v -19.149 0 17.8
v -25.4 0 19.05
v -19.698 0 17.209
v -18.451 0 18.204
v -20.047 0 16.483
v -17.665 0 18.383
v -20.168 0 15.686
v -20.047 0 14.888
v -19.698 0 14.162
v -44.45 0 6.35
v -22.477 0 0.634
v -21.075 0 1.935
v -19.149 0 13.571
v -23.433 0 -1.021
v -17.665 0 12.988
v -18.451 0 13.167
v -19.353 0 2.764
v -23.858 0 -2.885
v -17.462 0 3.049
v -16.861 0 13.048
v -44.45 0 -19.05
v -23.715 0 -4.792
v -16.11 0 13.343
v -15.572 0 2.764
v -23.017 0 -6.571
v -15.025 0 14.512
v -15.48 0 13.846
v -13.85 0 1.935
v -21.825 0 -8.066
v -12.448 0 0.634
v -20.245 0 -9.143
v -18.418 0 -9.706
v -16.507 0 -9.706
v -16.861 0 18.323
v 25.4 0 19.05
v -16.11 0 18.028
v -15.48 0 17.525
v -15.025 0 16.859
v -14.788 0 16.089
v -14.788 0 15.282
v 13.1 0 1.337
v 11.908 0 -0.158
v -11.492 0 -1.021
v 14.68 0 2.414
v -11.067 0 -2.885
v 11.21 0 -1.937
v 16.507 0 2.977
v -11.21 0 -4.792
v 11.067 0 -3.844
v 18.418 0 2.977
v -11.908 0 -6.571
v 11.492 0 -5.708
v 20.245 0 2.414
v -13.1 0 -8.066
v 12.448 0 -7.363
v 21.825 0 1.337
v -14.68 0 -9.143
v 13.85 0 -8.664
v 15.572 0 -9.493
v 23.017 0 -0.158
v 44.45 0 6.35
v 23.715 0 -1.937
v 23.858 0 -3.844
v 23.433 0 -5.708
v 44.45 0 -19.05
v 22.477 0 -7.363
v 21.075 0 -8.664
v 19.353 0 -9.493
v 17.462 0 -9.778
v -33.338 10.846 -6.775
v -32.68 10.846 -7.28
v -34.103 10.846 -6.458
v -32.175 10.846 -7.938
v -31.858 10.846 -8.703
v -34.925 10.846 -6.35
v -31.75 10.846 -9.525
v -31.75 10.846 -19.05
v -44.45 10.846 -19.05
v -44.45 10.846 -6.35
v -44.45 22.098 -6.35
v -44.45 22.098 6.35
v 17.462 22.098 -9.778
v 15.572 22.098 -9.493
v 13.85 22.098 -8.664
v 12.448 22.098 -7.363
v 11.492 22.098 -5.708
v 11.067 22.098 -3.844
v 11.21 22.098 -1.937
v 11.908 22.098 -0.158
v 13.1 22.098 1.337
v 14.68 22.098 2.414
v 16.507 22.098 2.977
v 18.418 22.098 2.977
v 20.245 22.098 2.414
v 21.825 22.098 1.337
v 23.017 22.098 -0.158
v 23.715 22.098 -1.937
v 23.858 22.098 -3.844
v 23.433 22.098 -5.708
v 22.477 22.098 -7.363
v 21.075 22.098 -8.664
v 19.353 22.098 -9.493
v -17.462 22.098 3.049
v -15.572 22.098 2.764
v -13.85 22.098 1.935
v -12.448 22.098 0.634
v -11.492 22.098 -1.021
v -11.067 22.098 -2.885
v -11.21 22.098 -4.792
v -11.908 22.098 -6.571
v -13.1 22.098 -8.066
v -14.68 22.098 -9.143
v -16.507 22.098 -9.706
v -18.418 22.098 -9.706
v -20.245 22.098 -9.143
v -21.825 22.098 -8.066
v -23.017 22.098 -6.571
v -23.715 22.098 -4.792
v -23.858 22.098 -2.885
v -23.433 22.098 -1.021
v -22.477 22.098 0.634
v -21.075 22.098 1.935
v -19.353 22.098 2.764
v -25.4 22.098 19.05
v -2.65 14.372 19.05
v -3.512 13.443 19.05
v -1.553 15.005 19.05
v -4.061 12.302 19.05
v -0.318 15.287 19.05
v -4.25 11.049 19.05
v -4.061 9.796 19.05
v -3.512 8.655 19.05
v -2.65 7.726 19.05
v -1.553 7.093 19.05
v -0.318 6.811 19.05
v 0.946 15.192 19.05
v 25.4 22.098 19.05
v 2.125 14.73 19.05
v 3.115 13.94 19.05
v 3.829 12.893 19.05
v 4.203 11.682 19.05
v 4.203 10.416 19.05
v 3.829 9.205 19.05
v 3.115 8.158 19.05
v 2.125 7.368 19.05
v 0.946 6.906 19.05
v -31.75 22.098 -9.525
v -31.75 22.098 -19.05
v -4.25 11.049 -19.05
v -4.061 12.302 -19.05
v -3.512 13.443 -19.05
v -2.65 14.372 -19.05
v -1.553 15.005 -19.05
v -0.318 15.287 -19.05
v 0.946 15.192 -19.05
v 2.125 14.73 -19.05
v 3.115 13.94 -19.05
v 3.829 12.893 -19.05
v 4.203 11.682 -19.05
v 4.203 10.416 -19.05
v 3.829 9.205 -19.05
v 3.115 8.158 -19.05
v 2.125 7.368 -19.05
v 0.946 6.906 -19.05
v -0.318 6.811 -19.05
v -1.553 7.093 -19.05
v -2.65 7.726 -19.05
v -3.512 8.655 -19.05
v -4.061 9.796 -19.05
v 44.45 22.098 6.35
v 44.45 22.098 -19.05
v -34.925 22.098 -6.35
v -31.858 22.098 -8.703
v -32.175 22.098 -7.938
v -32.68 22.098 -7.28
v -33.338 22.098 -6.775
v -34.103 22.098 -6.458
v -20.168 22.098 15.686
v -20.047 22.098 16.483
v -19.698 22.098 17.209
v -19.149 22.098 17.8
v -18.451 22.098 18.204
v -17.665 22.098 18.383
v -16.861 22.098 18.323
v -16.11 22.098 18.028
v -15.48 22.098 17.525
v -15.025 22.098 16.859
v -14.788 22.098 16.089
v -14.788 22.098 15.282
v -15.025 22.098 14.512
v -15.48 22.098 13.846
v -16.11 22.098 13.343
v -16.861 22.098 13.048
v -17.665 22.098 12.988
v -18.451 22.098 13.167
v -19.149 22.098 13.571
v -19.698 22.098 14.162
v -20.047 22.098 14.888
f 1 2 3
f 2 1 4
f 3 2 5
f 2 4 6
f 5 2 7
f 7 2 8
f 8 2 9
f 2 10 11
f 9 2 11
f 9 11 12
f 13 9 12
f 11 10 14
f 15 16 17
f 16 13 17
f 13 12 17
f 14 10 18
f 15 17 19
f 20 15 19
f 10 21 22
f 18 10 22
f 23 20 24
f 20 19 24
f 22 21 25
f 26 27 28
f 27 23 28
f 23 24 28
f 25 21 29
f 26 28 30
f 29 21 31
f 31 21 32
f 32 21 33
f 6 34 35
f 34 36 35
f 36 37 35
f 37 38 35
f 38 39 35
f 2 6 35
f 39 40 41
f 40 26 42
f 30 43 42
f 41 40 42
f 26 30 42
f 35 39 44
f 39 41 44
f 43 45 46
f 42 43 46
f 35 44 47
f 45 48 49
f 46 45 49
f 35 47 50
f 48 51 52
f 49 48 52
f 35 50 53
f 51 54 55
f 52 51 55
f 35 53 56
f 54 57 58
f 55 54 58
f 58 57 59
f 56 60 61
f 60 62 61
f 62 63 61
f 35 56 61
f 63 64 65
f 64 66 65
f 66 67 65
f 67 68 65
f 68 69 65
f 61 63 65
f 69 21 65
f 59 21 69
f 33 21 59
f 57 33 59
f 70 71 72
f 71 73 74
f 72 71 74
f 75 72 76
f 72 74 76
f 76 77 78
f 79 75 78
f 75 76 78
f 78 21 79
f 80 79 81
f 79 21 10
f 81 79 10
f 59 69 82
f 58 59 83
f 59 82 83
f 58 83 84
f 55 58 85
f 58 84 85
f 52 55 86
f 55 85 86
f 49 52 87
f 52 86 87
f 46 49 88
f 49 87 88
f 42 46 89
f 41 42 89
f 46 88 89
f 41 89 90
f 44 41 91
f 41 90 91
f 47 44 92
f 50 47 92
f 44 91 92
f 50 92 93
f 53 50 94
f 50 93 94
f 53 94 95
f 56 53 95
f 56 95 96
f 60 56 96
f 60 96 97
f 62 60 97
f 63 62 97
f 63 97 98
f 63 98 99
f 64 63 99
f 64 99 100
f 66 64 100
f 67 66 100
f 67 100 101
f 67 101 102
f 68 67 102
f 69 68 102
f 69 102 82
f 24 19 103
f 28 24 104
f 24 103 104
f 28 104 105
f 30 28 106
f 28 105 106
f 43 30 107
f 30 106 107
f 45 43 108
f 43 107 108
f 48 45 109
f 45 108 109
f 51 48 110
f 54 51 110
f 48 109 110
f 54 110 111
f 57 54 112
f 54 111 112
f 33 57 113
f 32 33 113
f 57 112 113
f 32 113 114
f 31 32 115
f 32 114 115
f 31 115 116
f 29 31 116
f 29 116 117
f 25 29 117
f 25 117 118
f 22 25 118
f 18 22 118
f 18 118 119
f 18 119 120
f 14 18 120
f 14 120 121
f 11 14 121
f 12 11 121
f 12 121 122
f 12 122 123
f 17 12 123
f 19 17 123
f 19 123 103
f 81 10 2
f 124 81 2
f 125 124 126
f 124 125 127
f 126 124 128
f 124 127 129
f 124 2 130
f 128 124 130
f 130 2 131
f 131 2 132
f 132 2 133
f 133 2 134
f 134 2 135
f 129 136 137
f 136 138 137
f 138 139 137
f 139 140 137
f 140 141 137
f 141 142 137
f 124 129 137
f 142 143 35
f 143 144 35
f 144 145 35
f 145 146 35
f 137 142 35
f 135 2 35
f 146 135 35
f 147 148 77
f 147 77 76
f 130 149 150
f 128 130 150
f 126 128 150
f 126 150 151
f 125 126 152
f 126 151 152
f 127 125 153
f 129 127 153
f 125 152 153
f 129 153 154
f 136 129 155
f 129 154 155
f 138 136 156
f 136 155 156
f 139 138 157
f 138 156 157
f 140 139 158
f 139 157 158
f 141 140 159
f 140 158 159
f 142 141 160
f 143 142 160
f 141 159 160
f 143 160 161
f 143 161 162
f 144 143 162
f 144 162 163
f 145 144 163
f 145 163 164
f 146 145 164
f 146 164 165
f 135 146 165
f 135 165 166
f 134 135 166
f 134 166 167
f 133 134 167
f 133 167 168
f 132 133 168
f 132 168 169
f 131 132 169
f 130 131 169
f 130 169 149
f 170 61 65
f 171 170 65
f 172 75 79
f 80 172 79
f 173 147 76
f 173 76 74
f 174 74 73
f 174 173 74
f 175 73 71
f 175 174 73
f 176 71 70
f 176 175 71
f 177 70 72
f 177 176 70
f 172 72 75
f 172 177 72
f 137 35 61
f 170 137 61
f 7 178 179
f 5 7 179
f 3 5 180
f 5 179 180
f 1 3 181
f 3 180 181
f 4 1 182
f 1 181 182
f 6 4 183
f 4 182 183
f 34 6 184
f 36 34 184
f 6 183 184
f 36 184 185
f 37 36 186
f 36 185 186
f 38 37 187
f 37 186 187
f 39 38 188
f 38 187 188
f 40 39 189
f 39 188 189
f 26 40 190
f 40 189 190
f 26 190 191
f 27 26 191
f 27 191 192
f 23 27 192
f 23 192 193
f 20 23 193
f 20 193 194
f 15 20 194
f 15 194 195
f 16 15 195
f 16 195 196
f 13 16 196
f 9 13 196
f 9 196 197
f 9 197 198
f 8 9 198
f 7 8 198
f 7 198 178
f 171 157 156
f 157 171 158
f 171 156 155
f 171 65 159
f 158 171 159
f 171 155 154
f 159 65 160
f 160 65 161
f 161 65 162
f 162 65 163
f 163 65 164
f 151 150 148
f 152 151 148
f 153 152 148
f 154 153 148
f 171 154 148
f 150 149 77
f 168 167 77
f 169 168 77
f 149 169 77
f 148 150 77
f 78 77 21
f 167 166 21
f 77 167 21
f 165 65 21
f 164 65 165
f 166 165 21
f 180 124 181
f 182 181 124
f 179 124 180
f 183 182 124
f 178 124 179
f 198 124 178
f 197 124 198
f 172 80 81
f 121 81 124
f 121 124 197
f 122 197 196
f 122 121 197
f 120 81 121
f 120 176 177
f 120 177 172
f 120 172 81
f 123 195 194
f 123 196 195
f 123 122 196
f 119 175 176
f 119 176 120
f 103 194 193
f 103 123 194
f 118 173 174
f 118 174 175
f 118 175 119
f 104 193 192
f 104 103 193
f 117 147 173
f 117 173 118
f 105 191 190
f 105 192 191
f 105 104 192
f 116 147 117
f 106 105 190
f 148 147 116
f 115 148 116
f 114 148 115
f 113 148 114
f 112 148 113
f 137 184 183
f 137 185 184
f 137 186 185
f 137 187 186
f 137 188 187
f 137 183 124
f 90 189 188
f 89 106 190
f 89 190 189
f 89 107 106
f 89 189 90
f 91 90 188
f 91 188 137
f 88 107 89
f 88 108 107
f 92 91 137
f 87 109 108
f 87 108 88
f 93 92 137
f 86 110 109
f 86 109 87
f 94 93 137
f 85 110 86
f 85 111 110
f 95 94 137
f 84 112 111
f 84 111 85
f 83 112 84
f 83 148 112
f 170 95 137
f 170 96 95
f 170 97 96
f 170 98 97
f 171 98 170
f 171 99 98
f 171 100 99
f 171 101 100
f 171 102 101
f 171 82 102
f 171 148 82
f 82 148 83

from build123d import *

# Parameters (mm, degrees)
BOSS_EXTRUDE1_DEPTH     = 22.098
CUT_EXTRUDE1_DEPTH      = 11.2522
M10X1_5_TAPPED_HOLE1_D  = 8.5
SKETCH6_R               = 6.4135
CUT_EXTRUDE2_DEPTH      = 54.169790332
F_1_4_28_TAPPED_HOLE1_D = 5.4102


with BuildPart() as part:
    # Sketch1 → Boss-Extrude1 (new body)
    with BuildSketch(Plane(origin=(0, 0, 0), x_dir=(1, 0, 0), z_dir=(0, 1, 0))):
        Polygon((-44.45, -6.35), (-25.4, -19.05), (25.4, -19.05), (44.45, -6.35), (44.45, 19.05), (-44.45, 19.05), align=None)
    extrude(amount=BOSS_EXTRUDE1_DEPTH)

    # Sketch2 → Cut-Extrude1 (cut)
    with BuildSketch(Plane(origin=(0, 22.098, 0), x_dir=(1, 0, 0), z_dir=(0, 1, 0))):
        with BuildLine():
            Line((-31.75, 19.05), (-31.75, 9.525))
            ThreePointArc((-31.75, 9.525), (-32.67993597, 7.27993597), (-34.925, 6.35))
            Line((-34.925, 6.35), (-44.45, 6.35))
            Line((-44.45, 6.35), (-44.45, 19.05))
            Line((-44.45, 19.05), (-31.75, 19.05))
        make_face()
    extrude(amount=-CUT_EXTRUDE1_DEPTH, mode=Mode.SUBTRACT)

    # M10x1.5 Tapped Hole1 (through all)
    with Locations(Plane.XY.offset(19.05)):
        with Locations((0, 11.049)):
            Hole(M10X1_5_TAPPED_HOLE1_D / 2)

    # Sketch6 → Cut-Extrude2 (cut, through all)
    with BuildSketch(Plane(origin=(0, 22.098, 0), x_dir=(1, 0, 0), z_dir=(0, 1, 0))):
        with Locations(Location((-17.4625, 3.364454491, 0), (0, 0, 270))):
            Circle(SKETCH6_R)
        with Locations(Location((17.4625, 3.364454491, 0), (0, 0, 90))):
            Circle(SKETCH6_R)
    extrude(amount=-CUT_EXTRUDE2_DEPTH, mode=Mode.SUBTRACT)

    # 1/4-28 Tapped Hole1 (through all)
    with Locations(Plane.XZ):
        with Locations((-17.4625, 15.685545509)):
            Hole(F_1_4_28_TAPPED_HOLE1_D / 2)


solid = part.part
